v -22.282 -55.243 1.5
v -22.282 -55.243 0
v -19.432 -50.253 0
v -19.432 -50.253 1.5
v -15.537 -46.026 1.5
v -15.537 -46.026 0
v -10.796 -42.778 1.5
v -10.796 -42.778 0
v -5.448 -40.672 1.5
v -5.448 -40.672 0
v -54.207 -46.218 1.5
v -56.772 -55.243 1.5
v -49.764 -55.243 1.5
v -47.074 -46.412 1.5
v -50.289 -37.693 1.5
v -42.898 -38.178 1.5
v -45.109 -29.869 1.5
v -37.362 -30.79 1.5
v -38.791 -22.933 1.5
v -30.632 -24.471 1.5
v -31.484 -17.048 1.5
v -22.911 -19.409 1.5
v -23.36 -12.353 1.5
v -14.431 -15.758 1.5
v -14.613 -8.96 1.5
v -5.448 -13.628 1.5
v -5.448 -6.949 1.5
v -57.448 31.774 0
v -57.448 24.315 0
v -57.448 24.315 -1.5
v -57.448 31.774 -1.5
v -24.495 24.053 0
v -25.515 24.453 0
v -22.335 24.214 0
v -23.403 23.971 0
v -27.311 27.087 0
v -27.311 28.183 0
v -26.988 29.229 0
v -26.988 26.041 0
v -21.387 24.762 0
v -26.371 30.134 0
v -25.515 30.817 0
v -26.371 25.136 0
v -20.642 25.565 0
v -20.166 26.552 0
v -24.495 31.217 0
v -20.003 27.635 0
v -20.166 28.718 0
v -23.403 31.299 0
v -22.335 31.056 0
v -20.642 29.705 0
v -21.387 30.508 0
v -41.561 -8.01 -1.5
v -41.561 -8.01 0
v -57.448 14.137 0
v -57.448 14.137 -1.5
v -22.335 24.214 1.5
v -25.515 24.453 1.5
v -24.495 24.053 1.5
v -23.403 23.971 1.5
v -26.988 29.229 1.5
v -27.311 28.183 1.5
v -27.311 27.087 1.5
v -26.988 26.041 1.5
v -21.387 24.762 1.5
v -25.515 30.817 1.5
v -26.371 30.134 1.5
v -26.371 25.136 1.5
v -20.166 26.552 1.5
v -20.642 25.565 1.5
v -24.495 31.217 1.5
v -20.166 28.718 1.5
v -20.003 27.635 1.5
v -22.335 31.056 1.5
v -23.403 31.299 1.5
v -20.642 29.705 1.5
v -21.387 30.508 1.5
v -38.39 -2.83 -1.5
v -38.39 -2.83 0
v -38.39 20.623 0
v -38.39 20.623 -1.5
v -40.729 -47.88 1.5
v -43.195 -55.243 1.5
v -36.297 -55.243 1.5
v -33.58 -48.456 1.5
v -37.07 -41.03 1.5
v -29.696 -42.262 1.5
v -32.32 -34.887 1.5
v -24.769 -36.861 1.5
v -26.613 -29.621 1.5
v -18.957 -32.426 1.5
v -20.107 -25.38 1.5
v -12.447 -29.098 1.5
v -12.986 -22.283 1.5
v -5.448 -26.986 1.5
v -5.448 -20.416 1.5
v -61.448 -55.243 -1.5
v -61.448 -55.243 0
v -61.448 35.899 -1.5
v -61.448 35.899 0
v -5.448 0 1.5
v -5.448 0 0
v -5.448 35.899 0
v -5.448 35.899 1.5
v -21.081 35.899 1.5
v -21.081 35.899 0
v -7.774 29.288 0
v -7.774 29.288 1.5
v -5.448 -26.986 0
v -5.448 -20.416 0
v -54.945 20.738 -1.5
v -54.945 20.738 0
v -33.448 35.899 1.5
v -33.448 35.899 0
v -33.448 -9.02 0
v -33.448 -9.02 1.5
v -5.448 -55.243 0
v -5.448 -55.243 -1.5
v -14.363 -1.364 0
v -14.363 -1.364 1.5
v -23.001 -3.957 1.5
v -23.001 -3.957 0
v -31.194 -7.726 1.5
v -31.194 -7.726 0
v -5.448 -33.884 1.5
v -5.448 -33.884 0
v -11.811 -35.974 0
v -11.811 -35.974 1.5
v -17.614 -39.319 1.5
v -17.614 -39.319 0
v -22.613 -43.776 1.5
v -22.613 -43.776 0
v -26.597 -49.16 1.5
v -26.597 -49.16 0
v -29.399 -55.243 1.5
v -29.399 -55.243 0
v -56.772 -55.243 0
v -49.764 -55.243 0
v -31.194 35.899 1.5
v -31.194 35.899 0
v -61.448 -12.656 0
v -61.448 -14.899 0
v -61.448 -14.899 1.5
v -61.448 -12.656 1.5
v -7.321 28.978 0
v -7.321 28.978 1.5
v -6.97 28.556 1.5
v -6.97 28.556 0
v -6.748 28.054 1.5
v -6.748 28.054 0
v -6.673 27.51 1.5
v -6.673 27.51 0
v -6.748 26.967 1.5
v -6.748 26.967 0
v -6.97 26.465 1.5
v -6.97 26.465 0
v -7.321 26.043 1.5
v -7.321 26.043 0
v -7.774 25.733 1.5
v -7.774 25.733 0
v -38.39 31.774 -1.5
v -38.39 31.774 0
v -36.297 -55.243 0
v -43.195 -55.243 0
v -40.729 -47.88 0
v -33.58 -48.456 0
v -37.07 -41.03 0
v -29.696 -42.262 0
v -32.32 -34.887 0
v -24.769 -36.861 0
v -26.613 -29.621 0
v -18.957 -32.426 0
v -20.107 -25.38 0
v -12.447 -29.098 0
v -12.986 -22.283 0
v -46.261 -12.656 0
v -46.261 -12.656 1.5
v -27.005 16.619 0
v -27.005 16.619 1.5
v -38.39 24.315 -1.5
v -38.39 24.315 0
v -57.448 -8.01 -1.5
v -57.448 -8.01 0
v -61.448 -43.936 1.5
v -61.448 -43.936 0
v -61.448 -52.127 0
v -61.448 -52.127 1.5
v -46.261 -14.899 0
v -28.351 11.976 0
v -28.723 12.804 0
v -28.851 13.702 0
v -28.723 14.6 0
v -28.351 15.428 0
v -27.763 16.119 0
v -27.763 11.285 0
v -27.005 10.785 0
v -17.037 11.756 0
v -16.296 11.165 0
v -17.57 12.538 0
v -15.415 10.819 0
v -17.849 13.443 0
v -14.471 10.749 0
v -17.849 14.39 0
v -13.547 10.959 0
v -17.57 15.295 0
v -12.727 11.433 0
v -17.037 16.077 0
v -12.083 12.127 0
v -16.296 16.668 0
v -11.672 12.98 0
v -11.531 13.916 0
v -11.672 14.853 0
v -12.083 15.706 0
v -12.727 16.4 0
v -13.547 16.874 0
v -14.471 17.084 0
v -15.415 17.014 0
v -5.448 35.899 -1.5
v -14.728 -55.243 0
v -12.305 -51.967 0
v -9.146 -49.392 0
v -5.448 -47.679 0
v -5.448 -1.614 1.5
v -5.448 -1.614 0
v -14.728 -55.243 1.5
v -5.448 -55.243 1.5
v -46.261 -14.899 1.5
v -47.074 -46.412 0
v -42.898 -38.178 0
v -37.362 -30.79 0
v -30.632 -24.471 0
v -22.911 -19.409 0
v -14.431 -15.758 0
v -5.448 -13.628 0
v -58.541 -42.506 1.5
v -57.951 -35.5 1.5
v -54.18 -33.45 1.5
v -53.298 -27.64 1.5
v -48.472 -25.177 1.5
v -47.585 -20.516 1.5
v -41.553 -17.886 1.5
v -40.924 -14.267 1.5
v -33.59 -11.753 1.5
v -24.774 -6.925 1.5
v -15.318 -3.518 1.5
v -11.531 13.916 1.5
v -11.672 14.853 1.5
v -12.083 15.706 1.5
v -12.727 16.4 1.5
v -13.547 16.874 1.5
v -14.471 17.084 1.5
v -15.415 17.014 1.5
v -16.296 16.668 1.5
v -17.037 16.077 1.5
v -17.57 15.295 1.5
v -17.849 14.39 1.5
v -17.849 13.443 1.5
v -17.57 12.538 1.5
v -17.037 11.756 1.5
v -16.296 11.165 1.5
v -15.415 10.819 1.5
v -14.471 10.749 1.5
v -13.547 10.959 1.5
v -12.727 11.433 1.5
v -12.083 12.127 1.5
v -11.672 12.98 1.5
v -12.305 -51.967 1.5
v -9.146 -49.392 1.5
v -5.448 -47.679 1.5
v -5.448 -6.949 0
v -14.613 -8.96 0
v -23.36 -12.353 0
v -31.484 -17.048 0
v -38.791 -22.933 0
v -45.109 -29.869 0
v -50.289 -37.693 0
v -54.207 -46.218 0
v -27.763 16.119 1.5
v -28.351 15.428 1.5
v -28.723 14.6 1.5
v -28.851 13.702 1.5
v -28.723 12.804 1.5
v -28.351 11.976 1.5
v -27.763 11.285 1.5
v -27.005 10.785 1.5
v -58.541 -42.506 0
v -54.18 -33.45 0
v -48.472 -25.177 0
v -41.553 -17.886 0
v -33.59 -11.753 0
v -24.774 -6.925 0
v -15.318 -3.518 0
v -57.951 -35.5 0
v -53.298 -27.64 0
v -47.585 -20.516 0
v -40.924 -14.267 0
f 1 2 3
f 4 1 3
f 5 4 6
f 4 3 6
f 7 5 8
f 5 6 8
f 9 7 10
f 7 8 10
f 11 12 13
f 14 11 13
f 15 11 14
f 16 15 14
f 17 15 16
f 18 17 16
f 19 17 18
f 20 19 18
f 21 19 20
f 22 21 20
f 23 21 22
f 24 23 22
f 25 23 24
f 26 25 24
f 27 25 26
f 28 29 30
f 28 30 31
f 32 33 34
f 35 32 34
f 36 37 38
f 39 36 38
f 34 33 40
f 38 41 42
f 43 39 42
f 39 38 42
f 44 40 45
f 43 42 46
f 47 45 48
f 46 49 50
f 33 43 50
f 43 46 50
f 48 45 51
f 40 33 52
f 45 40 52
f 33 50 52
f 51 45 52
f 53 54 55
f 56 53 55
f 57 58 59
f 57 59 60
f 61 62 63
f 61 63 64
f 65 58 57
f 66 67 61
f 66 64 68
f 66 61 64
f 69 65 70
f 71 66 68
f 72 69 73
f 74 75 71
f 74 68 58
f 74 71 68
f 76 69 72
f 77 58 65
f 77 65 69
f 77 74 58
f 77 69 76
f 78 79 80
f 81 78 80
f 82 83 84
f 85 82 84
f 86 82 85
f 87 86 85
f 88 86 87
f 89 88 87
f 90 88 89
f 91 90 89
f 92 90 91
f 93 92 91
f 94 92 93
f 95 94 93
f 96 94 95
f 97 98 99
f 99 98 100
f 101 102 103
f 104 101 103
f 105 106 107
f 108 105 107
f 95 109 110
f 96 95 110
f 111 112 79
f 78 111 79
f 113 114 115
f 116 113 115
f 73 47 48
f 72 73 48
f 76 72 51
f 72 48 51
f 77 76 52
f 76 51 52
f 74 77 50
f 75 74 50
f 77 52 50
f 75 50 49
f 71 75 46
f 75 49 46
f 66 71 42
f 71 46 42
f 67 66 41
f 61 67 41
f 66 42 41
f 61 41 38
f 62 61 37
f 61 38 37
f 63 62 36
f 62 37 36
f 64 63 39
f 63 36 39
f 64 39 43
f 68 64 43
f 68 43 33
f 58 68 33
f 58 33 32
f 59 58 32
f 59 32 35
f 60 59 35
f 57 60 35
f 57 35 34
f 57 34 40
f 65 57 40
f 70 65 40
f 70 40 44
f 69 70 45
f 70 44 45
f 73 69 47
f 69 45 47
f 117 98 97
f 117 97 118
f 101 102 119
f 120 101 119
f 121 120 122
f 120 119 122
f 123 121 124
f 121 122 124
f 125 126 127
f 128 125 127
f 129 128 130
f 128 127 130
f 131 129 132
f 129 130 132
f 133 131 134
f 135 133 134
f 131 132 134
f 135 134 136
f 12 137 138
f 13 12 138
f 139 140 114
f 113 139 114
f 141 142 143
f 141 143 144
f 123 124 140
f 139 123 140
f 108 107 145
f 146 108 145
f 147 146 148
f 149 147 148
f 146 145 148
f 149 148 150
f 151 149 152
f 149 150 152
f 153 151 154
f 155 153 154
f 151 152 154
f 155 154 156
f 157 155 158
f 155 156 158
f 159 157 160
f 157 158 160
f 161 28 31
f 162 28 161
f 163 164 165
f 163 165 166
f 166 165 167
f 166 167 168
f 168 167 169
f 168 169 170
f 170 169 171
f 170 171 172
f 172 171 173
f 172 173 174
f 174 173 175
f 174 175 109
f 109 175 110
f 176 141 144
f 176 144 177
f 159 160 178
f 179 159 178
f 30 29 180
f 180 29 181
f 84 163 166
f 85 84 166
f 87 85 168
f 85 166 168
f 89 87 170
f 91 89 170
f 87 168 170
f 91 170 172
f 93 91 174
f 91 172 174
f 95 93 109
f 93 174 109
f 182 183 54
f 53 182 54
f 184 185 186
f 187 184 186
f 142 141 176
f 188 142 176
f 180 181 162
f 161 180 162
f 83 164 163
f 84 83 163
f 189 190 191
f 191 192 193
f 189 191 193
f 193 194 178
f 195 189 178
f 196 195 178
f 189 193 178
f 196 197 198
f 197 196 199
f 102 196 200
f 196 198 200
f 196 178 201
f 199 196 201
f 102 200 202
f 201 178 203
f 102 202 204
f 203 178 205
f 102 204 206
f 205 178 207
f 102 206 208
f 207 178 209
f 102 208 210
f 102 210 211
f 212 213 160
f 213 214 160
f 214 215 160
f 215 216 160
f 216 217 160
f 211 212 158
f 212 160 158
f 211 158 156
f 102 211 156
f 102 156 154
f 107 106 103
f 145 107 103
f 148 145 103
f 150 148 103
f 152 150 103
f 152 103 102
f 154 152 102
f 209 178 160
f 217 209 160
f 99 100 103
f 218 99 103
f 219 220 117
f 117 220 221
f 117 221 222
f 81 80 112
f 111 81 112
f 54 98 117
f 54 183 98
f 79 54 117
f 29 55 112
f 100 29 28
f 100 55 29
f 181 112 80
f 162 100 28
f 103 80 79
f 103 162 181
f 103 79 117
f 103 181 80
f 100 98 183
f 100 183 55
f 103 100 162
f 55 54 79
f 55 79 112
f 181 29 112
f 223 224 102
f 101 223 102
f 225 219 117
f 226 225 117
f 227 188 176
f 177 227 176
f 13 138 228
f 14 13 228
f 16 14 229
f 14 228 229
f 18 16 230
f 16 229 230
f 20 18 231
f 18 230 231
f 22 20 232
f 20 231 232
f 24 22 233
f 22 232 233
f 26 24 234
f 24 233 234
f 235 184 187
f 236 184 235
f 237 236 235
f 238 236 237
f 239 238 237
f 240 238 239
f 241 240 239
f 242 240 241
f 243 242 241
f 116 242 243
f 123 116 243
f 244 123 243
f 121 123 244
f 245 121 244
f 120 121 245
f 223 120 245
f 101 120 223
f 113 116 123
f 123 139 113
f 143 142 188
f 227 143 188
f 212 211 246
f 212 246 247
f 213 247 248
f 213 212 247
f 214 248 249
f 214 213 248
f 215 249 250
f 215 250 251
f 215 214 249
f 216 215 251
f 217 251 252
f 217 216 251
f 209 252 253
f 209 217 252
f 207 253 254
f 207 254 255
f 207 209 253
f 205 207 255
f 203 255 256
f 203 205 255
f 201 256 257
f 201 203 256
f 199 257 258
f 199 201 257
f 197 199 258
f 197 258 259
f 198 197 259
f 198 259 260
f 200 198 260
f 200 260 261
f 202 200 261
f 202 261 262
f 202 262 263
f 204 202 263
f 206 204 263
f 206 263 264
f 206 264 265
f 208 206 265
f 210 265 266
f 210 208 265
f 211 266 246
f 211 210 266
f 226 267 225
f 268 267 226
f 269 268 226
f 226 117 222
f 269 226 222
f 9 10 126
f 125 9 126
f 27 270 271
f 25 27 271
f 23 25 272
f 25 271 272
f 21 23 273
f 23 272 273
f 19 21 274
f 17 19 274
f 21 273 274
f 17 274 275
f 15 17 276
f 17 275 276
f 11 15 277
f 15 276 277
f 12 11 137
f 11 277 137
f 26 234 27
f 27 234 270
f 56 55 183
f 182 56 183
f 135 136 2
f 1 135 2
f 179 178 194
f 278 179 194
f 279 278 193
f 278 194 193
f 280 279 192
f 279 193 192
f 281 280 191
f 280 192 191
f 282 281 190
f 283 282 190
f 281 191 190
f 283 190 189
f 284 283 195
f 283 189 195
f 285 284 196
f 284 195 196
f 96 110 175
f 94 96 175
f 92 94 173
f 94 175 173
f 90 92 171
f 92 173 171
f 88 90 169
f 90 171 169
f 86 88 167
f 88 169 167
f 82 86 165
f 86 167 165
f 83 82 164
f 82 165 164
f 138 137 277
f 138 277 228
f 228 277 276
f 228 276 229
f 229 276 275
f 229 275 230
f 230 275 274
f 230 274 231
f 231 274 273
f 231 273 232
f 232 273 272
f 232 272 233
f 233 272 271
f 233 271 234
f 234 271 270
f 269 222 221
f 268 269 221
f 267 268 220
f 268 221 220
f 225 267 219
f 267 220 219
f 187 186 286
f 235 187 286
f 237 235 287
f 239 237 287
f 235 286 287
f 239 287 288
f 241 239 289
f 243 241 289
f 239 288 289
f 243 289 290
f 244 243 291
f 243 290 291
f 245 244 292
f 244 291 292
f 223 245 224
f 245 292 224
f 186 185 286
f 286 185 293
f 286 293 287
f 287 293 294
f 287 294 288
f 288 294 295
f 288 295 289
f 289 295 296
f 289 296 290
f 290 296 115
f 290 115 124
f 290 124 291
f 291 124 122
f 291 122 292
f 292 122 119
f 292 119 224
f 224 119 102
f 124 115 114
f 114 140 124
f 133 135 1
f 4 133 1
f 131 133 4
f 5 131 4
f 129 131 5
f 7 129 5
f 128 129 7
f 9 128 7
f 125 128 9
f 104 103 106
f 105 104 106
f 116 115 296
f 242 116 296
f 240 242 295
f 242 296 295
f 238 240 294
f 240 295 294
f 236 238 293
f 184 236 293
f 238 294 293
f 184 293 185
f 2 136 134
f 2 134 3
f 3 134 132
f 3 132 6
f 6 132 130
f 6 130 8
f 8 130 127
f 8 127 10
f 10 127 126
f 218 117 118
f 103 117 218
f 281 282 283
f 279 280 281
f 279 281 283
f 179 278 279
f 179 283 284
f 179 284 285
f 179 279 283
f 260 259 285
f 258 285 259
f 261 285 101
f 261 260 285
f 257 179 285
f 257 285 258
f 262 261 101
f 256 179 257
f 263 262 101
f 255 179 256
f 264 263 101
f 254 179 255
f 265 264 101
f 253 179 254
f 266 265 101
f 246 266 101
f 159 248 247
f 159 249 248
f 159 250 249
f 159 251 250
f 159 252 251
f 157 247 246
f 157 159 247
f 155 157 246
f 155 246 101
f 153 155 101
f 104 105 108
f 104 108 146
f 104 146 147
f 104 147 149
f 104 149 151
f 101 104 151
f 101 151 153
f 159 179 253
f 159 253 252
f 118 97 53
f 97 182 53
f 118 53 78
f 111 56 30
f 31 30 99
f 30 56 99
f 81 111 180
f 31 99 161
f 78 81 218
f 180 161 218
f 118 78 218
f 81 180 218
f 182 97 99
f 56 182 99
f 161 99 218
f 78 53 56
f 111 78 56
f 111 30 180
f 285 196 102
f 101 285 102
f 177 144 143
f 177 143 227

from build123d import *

# Parameters (mm, degrees)
F0_R     = 3.674578
F0_R_2   = 3.176801
F0_W     = 15.187611
F0_H     = 2.243437
F1_DEPTH = 1.5
F2_W     = 56
F2_H     = 91.1417
F3_DEPTH = 1.5
F4_W     = 19.058415
F4_H     = 7.459357
F5_DEPTH = 25


with BuildPart() as f1:
    # F0 (on Top) → F1 (new body)
    with BuildSketch(Plane.XY):
        with Locations((-23.677766, 27.635051)):
            Circle(F0_R)
        with BuildLine():
            Line((-5.448467, -55.242935), (-5.448467, -47.679409))
            ThreePointArc((-5.448467, -47.679409), (-10.806044, -50.580326), (-14.727656, -55.242935))
            Line((-14.727656, -55.242935), (-5.448467, -55.242935))
        make_face()
        with BuildLine():
            ThreePointArc((-22.282466, -55.242935), (-15.536918, -46.026435), (-5.448467, -40.672049))
            Line((-5.448467, -40.672049), (-5.448467, -33.883668))
            ThreePointArc((-5.448467, -33.883668), (-20.22782, -41.419164), (-29.399315, -55.242935))
            Line((-29.399315, -55.242935), (-22.282466, -55.242935))
        make_face()
        with BuildLine():
            ThreePointArc((-36.297187, -55.242935), (-24.768946, -36.860919), (-5.448467, -26.9858))
            Line((-5.448467, -26.9858), (-5.448467, -20.416399))
            ThreePointArc((-5.448467, -20.416399), (-29.576455, -32.134391), (-43.195058, -55.242935))
            Line((-43.195058, -55.242935), (-36.297187, -55.242935))
        make_face()
        with BuildLine():
            ThreePointArc((-49.764454, -55.242935), (-34.133993, -27.484267), (-5.448467, -13.628021))
            Line((-5.448467, -13.628021), (-5.448467, -6.949131))
            ThreePointArc((-5.448467, -6.949131), (-38.791205, -22.933125), (-56.771815, -55.242935))
            Line((-56.771815, -55.242935), (-49.764454, -55.242935))
        make_face()
        with BuildLine():
            Line((-27.00546, 10.785483), (-5.448467, 0))
            Line((-5.448467, 0), (-5.448467, 35.898765))
            Line((-5.448467, 35.898765), (-21.081116, 35.898765))
            Line((-21.081116, 35.898765), (-7.774128, 29.287666))
            ThreePointArc((-7.774128, 29.287666), (-6.672557, 27.510363), (-7.774128, 25.733059))
            Line((-7.774128, 25.733059), (-27.00546, 16.618684))
            ThreePointArc((-27.00546, 16.618684), (-28.85076, 13.702083), (-27.00546, 10.785483))
        make_face()
        with Locations((-14.707915, 13.916458)):
            Circle(F0_R_2, mode=Mode.SUBTRACT)
        with BuildLine():
            ThreePointArc((-61.448467, -52.127492), (-41.552769, -17.886139), (-5.448467, -1.613816))
            Line((-5.448467, -1.613816), (-5.448467, 0))
            ThreePointArc((-5.448467, 0), (-18.727632, -2.509739), (-31.194469, -7.726347))
            Line((-31.194469, -7.726347), (-31.194469, 35.898765))
            Line((-31.194469, 35.898765), (-33.448467, 35.898765))
            Line((-33.448467, 35.898765), (-33.448467, -9.020384))
            ThreePointArc((-33.448467, -9.020384), (-50.567629, -23.97688), (-61.448467, -43.936085))
            Line((-61.448467, -43.936085), (-61.448467, -52.127492))
        make_face()
        with Locations((-53.854661, -13.777627)):
            Rectangle(F0_W, F0_H)
    extrude(amount=F1_DEPTH)


with BuildPart() as f3:
    # F2 (on Top) → F3 (new body)
    with BuildSketch(Plane.XY):
        with Locations((-33.448467, -9.672085)):
            Rectangle(F2_W, F2_H)
    extrude(amount=-F3_DEPTH)

    # F4 (on Top) → F5 (cut)
    with BuildSketch(Plane.XY):
        with Locations((-47.919259, 28.044719)):
            Rectangle(F4_W, F4_H)
        Polygon((-38.390052, -2.830462), (-38.390052, 20.622665), (-54.945201, 20.737631), align=None)
        Polygon((-41.560765, -8.009771), (-57.448467, 14.137024), (-57.448467, -8.009771), align=None)
    extrude(amount=-F5_DEPTH, mode=Mode.SUBTRACT)


solid = Compound([f1.part, f3.part])
